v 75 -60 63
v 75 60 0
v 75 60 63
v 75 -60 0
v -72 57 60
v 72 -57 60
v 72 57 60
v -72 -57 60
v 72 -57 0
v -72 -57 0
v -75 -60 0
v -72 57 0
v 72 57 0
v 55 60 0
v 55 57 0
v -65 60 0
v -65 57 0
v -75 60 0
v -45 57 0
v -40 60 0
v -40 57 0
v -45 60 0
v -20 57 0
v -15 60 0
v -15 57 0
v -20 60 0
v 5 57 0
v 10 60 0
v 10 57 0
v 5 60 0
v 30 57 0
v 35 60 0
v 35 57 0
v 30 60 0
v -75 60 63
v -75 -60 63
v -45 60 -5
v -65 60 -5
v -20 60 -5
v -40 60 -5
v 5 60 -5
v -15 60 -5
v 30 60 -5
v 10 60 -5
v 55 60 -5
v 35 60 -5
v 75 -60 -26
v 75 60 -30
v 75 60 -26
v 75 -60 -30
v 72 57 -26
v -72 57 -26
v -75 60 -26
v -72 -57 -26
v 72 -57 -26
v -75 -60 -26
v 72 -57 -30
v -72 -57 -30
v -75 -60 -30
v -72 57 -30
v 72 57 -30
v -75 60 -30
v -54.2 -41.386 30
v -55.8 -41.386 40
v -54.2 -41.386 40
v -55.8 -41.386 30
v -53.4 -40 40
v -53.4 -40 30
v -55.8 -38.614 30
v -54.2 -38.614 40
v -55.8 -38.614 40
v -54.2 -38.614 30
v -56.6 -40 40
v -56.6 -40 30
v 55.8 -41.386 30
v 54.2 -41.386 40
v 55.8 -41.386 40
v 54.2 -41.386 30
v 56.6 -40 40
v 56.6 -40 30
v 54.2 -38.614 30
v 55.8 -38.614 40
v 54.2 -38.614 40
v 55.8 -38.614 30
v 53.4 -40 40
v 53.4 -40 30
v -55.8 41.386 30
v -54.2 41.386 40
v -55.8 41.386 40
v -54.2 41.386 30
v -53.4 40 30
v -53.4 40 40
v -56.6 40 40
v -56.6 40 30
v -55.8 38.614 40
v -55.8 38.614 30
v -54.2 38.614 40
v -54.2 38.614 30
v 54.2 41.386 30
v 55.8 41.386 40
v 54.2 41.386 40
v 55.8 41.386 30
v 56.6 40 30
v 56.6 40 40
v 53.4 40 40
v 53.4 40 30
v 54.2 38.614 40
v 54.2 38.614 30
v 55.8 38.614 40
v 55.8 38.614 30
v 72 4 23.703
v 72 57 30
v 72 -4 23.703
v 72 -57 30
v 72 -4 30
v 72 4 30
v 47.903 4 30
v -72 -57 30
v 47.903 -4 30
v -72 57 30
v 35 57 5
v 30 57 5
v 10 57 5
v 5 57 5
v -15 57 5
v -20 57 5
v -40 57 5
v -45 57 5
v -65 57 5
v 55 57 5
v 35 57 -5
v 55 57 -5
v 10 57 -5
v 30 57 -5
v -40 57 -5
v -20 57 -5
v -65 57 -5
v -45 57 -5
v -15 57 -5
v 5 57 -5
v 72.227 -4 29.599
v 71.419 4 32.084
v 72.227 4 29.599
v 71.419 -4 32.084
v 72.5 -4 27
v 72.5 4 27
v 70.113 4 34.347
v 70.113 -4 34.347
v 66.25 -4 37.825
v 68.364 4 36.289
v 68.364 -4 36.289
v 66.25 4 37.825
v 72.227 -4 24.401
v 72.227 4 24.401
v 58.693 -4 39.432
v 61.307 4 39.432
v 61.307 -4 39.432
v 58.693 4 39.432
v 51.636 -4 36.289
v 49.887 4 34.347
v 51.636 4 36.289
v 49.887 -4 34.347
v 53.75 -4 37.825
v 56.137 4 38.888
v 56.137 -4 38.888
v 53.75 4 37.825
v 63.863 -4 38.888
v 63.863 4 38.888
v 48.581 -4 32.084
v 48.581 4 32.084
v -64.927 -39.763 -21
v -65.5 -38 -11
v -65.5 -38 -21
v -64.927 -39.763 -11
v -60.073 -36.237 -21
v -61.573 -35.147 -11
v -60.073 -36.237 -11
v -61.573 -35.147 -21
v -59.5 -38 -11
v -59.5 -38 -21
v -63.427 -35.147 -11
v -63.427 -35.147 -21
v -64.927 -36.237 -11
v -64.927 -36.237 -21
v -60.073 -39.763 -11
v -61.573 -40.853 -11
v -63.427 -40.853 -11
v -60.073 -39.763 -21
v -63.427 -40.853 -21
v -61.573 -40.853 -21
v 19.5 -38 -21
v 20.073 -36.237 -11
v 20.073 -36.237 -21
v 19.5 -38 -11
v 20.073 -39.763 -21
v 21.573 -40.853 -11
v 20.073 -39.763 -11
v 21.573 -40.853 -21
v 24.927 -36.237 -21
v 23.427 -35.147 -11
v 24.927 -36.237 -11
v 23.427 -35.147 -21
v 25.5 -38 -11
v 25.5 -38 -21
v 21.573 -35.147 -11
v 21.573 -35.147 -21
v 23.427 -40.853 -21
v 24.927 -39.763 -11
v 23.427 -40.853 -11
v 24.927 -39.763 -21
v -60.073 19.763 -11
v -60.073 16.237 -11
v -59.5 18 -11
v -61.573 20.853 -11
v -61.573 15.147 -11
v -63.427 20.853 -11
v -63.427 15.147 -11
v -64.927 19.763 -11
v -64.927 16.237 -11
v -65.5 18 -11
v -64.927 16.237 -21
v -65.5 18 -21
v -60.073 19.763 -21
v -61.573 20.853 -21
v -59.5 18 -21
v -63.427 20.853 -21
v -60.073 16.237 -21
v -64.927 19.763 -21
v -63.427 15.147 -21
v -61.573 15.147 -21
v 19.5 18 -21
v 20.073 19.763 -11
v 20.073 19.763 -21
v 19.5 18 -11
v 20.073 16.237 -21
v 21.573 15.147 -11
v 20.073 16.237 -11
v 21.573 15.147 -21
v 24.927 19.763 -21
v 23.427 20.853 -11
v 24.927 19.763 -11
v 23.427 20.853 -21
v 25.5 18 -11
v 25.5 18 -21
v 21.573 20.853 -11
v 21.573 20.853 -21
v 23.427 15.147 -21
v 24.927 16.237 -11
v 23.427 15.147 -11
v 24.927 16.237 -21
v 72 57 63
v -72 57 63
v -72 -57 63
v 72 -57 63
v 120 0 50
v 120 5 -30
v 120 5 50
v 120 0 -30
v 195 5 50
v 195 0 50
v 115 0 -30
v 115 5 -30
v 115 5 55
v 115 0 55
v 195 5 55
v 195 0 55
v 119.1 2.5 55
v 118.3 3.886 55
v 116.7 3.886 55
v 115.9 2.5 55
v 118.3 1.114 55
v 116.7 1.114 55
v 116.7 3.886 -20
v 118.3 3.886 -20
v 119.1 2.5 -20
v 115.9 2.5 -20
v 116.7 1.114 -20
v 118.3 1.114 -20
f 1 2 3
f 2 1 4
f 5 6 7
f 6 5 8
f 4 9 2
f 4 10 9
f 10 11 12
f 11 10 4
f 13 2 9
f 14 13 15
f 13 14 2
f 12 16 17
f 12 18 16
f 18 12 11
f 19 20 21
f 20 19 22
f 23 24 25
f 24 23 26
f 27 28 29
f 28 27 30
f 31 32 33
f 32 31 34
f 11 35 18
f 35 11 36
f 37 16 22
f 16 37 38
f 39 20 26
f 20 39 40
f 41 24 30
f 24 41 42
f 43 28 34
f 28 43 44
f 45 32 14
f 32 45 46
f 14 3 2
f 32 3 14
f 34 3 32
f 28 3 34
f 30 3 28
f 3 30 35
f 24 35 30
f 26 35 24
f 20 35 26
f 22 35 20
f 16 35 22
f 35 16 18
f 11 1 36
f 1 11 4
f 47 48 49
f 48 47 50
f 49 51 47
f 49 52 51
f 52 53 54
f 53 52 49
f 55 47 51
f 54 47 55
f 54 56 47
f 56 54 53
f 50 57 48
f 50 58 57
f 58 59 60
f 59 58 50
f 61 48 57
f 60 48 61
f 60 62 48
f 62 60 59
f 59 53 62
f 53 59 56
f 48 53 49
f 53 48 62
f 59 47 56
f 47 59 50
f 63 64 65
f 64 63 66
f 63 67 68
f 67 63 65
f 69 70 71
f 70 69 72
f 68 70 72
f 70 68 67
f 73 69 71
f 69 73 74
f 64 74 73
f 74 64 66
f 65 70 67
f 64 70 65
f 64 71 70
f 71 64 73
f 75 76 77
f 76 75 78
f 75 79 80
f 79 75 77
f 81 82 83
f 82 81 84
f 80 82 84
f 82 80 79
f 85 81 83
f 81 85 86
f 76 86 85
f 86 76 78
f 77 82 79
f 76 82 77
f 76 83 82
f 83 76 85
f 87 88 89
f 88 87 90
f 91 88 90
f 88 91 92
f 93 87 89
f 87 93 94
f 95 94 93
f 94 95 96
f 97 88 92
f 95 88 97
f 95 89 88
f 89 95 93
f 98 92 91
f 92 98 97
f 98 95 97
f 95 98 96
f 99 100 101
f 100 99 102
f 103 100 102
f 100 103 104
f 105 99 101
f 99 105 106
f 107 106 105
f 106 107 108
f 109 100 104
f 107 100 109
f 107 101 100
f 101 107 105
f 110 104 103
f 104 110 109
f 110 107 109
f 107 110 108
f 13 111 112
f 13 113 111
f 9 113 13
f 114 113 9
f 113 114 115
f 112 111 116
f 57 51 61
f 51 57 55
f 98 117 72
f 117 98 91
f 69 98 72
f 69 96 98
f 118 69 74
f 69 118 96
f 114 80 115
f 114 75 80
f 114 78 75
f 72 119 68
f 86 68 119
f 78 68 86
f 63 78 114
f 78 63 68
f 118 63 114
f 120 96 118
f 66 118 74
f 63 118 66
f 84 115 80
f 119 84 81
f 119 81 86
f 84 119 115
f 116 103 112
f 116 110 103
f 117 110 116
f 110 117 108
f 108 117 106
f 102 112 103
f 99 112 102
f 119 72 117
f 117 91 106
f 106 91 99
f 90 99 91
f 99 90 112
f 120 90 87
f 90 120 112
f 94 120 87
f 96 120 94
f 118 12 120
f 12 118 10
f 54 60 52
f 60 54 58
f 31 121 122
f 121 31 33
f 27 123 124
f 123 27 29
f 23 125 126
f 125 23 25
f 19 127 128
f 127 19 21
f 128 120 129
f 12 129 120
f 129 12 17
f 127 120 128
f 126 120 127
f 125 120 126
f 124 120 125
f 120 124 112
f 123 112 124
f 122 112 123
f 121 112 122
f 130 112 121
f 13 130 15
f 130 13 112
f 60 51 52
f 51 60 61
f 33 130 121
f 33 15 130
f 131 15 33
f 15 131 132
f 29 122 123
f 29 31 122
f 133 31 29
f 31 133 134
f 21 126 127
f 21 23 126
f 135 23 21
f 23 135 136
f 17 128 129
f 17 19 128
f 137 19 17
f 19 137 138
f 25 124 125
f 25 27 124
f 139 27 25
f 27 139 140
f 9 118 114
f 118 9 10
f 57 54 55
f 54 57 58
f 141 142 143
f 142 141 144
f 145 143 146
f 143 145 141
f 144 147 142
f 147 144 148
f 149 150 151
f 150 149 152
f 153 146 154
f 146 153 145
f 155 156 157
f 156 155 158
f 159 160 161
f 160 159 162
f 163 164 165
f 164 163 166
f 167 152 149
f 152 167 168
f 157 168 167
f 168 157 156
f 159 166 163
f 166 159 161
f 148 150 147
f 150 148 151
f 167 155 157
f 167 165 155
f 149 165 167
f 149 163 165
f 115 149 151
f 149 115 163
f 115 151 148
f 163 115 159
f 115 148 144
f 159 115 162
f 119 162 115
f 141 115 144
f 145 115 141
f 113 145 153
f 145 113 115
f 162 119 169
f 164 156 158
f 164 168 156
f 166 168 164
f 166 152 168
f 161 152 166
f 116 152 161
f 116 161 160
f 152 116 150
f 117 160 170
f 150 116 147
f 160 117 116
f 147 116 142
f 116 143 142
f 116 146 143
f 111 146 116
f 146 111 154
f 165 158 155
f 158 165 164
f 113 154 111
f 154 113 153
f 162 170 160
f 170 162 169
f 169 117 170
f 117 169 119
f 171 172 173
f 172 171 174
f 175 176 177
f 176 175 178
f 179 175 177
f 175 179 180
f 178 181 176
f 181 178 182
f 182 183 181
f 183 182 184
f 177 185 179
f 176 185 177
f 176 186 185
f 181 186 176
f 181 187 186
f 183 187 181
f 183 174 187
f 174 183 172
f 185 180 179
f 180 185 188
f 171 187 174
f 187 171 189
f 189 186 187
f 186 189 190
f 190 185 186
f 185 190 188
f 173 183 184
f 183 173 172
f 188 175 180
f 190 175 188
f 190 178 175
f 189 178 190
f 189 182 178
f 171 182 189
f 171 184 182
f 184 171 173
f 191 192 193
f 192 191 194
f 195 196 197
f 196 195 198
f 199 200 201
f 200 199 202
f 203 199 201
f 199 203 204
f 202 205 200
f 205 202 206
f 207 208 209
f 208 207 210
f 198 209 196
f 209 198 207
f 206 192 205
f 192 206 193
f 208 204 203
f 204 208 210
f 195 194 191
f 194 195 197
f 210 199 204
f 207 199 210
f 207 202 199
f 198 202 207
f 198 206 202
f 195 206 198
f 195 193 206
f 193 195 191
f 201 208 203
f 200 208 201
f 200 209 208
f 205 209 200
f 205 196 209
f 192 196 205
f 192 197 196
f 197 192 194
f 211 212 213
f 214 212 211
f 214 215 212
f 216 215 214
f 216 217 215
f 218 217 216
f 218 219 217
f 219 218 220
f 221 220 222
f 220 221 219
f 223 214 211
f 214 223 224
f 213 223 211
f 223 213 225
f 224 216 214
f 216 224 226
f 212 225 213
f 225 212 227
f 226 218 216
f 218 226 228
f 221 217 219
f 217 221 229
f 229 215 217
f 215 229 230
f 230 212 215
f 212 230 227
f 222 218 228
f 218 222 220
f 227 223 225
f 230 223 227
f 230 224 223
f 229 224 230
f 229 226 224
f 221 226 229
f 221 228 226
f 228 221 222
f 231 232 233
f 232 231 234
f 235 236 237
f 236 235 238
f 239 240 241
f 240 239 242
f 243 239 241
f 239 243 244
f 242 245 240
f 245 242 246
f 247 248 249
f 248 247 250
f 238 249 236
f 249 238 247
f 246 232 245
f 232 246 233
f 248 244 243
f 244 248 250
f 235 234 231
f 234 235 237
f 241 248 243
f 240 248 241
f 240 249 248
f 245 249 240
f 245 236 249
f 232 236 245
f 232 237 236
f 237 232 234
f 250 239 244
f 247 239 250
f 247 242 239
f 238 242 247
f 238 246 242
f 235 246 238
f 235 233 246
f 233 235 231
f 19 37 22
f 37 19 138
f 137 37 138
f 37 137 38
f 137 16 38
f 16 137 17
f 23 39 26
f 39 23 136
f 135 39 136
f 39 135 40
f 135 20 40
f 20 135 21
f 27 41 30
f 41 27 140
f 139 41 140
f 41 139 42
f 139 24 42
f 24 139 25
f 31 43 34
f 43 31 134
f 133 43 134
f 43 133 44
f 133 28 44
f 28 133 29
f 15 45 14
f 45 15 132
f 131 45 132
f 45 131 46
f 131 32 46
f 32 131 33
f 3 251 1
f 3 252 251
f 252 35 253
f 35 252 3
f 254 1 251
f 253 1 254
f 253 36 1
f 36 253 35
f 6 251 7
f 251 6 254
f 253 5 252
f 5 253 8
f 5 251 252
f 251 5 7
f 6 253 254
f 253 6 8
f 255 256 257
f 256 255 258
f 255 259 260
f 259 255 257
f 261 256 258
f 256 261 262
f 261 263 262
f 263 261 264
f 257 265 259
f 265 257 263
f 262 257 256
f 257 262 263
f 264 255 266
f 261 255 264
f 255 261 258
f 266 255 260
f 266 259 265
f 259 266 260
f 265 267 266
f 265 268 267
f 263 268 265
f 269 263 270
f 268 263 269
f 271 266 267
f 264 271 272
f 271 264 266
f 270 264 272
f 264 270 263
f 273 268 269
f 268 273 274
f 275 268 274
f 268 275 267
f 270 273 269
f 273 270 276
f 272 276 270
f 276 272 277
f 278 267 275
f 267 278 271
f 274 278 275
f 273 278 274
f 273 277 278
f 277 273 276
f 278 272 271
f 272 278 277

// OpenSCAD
// Texas Wildlife ID - 3D Printed Enclosure v2 with lid and cable glands
enclosure_width = 150;
enclosure_depth = 120;
enclosure_height = 60;
wall_thickness = 3;
base_thickness = 4;
lid_thickness = 3;
standoff_height = 10;

mount_hole_dia = 3.2;
mount_grid = [[20,20],[130,20],[20,100],[130,100]];

camera_hole_dia = 25;
cable_gland_dia = 12;

// Solar panel bracket params
solar_panel_width = 200;
solar_panel_depth = 150;
bracket_length = 80;
bracket_thickness = 5;


module base(){
    difference(){
        union(){
            translate([0,0,enclosure_height/2]) cube([enclosure_width, enclosure_depth, enclosure_height], center=true);
            translate([0,0,-enclosure_height/2 + base_thickness/2]) cube([enclosure_width, enclosure_depth, base_thickness], center=true);
        }
        translate([0,0,0]) cube([enclosure_width-2*wall_thickness, enclosure_depth-2*wall_thickness, enclosure_height], center=true);
        for(p = mount_grid){
            translate([p[0]-enclosure_width/2, p[1]-enclosure_depth/2, -enclosure_height/2]) cylinder(h=enclosure_height+10, d=mount_hole_dia, center=false);
        }
        // Camera cutout
        translate([enclosure_width/2 - 15, 0, enclosure_height/2 - wall_thickness])
        rotate([90,0,0])
        cylinder(h=wall_thickness+5, d=camera_hole_dia, center=true);
        // Cable glands
        translate([-enclosure_width/2 + 20, 0, -enclosure_height/2 + wall_thickness])
        rotate([90,0,90])
        cylinder(h=wall_thickness+5, d=cable_gland_dia, center=true);
        translate([enclosure_width/2 - 20, 0, -enclosure_height/2 + wall_thickness])
        rotate([90,0,90])
        cylinder(h=wall_thickness+5, d=cable_gland_dia, center=true);
    }
}

module lid(){
    difference(){
        translate([0,0,enclosure_height + lid_thickness/2]) cube([enclosure_width, enclosure_depth, lid_thickness], center=true);
        // Gasket channel
        translate([0,0,enclosure_height + lid_thickness/2 - 0.5])
        cube([enclosure_width-2*wall_thickness, enclosure_depth-2*wall_thickness, lid_thickness+2], center=true);
    }
}

module pi_standoffs(){
    translate([-20, -10, -enclosure_height/2 + base_thickness + standoff_height/2]){
        for(i=[0:3]){
            x = i%2==0 ? -42.5 : 42.5;
            y = i<2 ? -28 : 28;
            translate([x, y, 0]) cylinder(h=standoff_height, d=6);
        }
    }
}

module vents(){
    for(i=[0:4]){
        translate([-enclosure_width/2+20 + i*25, enclosure_depth/2 - wall_thickness/2, 0])
        cube([20, wall_thickness, 10], center=true);
    }
}

module solar_bracket(){
    // Simple L-bracket to mount solar panel above enclosure
    translate([enclosure_width/2 + bracket_length/2, 0, -enclosure_height/2])
    difference(){
        union(){
            // Vertical leg
            cube([bracket_thickness, bracket_thickness, enclosure_height + 20], center=false);
            // Horizontal leg for panel
            translate([0, 0, enclosure_height + 20])
            cube([bracket_length, bracket_thickness, bracket_thickness], center=false);
        }
        // Mounting holes
        translate([bracket_thickness/2, bracket_thickness/2, 10])
        cylinder(h=enclosure_height+30, d=mount_hole_dia, center=false);
    }
}

module cable_gland(){
    // Weatherproof PG7 style gland body
    difference(){
        cylinder(h=15, d=20, center=false);
        translate([0,0,2]) cylinder(h=13, d=12, center=false);
        translate([0,0,2]) cylinder(h=13, d=6, center=false);
    }
}

base();
pi_standoffs();
vents();
lid();
solar_bracket();
// cable_gland(); // uncomment to preview
